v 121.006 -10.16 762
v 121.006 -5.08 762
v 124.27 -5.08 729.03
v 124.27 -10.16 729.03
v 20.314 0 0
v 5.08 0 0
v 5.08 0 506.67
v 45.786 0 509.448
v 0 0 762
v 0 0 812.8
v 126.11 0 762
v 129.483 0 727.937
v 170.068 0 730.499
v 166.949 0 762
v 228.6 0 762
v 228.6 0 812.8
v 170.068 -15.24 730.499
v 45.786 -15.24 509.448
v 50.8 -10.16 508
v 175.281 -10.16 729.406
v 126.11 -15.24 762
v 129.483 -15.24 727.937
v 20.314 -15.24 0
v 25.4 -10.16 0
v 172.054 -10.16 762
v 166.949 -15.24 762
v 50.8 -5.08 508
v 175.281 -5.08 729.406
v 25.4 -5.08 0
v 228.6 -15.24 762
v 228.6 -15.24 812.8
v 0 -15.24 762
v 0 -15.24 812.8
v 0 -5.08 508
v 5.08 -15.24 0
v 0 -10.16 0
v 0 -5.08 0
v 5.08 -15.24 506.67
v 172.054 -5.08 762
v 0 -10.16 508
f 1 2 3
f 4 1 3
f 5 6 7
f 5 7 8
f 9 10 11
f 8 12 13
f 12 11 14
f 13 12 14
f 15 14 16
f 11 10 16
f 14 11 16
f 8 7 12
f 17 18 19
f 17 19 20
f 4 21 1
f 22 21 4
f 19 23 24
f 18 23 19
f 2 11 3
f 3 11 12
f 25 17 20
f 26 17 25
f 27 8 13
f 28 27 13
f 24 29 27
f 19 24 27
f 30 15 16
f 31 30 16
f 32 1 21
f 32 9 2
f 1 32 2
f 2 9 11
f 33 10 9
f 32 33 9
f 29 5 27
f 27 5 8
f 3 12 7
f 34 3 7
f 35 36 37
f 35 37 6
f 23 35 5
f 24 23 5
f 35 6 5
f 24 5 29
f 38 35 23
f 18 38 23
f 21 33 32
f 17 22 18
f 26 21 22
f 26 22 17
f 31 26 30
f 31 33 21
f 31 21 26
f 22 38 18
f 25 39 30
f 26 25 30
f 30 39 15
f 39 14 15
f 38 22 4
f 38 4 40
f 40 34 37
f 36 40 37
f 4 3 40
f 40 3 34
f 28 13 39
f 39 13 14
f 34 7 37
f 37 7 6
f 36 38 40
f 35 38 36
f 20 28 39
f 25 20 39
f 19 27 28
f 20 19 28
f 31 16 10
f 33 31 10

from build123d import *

# Parameters (mm, degrees)
F1_DEPTH = 15.24
F2_SIZE  = 5.08


with BuildPart() as f1:
    # F0 (on Front) → F1 (new body)
    with BuildSketch(Plane.XZ):
        Polygon((0, 508), (0, 0), (25.4, 0), (50.8, 508), (175.280874, 729.405763), (172.053954, 762), (228.6, 762), (228.6, 812.8), (0, 812.8), (0, 762), (121.005602, 762), (124.269706, 729.030173), align=None)
    extrude(amount=F1_DEPTH)

    # F2
    f2_edges = [f1.edges().sort_by_distance(p)[0] for p in [
        (113.040437, -15.24, 618.702882),
        (38.1, -15.24, 254),
        (0, -15.24, 254),
        (62.134853, -15.24, 618.515087),
        (0, 0, 254),
        (62.134853, 0, 618.515087),
        (38.1, 0, 254),
        (113.040437, 0, 618.702882),
        (122.637654, 0, 745.515087),
        (173.667414, 0, 745.702882),
        (173.667414, -15.24, 745.702882),
        (122.637654, -15.24, 745.515087),
    ]]
    chamfer(f2_edges, length=F2_SIZE)


solid = f1.part
